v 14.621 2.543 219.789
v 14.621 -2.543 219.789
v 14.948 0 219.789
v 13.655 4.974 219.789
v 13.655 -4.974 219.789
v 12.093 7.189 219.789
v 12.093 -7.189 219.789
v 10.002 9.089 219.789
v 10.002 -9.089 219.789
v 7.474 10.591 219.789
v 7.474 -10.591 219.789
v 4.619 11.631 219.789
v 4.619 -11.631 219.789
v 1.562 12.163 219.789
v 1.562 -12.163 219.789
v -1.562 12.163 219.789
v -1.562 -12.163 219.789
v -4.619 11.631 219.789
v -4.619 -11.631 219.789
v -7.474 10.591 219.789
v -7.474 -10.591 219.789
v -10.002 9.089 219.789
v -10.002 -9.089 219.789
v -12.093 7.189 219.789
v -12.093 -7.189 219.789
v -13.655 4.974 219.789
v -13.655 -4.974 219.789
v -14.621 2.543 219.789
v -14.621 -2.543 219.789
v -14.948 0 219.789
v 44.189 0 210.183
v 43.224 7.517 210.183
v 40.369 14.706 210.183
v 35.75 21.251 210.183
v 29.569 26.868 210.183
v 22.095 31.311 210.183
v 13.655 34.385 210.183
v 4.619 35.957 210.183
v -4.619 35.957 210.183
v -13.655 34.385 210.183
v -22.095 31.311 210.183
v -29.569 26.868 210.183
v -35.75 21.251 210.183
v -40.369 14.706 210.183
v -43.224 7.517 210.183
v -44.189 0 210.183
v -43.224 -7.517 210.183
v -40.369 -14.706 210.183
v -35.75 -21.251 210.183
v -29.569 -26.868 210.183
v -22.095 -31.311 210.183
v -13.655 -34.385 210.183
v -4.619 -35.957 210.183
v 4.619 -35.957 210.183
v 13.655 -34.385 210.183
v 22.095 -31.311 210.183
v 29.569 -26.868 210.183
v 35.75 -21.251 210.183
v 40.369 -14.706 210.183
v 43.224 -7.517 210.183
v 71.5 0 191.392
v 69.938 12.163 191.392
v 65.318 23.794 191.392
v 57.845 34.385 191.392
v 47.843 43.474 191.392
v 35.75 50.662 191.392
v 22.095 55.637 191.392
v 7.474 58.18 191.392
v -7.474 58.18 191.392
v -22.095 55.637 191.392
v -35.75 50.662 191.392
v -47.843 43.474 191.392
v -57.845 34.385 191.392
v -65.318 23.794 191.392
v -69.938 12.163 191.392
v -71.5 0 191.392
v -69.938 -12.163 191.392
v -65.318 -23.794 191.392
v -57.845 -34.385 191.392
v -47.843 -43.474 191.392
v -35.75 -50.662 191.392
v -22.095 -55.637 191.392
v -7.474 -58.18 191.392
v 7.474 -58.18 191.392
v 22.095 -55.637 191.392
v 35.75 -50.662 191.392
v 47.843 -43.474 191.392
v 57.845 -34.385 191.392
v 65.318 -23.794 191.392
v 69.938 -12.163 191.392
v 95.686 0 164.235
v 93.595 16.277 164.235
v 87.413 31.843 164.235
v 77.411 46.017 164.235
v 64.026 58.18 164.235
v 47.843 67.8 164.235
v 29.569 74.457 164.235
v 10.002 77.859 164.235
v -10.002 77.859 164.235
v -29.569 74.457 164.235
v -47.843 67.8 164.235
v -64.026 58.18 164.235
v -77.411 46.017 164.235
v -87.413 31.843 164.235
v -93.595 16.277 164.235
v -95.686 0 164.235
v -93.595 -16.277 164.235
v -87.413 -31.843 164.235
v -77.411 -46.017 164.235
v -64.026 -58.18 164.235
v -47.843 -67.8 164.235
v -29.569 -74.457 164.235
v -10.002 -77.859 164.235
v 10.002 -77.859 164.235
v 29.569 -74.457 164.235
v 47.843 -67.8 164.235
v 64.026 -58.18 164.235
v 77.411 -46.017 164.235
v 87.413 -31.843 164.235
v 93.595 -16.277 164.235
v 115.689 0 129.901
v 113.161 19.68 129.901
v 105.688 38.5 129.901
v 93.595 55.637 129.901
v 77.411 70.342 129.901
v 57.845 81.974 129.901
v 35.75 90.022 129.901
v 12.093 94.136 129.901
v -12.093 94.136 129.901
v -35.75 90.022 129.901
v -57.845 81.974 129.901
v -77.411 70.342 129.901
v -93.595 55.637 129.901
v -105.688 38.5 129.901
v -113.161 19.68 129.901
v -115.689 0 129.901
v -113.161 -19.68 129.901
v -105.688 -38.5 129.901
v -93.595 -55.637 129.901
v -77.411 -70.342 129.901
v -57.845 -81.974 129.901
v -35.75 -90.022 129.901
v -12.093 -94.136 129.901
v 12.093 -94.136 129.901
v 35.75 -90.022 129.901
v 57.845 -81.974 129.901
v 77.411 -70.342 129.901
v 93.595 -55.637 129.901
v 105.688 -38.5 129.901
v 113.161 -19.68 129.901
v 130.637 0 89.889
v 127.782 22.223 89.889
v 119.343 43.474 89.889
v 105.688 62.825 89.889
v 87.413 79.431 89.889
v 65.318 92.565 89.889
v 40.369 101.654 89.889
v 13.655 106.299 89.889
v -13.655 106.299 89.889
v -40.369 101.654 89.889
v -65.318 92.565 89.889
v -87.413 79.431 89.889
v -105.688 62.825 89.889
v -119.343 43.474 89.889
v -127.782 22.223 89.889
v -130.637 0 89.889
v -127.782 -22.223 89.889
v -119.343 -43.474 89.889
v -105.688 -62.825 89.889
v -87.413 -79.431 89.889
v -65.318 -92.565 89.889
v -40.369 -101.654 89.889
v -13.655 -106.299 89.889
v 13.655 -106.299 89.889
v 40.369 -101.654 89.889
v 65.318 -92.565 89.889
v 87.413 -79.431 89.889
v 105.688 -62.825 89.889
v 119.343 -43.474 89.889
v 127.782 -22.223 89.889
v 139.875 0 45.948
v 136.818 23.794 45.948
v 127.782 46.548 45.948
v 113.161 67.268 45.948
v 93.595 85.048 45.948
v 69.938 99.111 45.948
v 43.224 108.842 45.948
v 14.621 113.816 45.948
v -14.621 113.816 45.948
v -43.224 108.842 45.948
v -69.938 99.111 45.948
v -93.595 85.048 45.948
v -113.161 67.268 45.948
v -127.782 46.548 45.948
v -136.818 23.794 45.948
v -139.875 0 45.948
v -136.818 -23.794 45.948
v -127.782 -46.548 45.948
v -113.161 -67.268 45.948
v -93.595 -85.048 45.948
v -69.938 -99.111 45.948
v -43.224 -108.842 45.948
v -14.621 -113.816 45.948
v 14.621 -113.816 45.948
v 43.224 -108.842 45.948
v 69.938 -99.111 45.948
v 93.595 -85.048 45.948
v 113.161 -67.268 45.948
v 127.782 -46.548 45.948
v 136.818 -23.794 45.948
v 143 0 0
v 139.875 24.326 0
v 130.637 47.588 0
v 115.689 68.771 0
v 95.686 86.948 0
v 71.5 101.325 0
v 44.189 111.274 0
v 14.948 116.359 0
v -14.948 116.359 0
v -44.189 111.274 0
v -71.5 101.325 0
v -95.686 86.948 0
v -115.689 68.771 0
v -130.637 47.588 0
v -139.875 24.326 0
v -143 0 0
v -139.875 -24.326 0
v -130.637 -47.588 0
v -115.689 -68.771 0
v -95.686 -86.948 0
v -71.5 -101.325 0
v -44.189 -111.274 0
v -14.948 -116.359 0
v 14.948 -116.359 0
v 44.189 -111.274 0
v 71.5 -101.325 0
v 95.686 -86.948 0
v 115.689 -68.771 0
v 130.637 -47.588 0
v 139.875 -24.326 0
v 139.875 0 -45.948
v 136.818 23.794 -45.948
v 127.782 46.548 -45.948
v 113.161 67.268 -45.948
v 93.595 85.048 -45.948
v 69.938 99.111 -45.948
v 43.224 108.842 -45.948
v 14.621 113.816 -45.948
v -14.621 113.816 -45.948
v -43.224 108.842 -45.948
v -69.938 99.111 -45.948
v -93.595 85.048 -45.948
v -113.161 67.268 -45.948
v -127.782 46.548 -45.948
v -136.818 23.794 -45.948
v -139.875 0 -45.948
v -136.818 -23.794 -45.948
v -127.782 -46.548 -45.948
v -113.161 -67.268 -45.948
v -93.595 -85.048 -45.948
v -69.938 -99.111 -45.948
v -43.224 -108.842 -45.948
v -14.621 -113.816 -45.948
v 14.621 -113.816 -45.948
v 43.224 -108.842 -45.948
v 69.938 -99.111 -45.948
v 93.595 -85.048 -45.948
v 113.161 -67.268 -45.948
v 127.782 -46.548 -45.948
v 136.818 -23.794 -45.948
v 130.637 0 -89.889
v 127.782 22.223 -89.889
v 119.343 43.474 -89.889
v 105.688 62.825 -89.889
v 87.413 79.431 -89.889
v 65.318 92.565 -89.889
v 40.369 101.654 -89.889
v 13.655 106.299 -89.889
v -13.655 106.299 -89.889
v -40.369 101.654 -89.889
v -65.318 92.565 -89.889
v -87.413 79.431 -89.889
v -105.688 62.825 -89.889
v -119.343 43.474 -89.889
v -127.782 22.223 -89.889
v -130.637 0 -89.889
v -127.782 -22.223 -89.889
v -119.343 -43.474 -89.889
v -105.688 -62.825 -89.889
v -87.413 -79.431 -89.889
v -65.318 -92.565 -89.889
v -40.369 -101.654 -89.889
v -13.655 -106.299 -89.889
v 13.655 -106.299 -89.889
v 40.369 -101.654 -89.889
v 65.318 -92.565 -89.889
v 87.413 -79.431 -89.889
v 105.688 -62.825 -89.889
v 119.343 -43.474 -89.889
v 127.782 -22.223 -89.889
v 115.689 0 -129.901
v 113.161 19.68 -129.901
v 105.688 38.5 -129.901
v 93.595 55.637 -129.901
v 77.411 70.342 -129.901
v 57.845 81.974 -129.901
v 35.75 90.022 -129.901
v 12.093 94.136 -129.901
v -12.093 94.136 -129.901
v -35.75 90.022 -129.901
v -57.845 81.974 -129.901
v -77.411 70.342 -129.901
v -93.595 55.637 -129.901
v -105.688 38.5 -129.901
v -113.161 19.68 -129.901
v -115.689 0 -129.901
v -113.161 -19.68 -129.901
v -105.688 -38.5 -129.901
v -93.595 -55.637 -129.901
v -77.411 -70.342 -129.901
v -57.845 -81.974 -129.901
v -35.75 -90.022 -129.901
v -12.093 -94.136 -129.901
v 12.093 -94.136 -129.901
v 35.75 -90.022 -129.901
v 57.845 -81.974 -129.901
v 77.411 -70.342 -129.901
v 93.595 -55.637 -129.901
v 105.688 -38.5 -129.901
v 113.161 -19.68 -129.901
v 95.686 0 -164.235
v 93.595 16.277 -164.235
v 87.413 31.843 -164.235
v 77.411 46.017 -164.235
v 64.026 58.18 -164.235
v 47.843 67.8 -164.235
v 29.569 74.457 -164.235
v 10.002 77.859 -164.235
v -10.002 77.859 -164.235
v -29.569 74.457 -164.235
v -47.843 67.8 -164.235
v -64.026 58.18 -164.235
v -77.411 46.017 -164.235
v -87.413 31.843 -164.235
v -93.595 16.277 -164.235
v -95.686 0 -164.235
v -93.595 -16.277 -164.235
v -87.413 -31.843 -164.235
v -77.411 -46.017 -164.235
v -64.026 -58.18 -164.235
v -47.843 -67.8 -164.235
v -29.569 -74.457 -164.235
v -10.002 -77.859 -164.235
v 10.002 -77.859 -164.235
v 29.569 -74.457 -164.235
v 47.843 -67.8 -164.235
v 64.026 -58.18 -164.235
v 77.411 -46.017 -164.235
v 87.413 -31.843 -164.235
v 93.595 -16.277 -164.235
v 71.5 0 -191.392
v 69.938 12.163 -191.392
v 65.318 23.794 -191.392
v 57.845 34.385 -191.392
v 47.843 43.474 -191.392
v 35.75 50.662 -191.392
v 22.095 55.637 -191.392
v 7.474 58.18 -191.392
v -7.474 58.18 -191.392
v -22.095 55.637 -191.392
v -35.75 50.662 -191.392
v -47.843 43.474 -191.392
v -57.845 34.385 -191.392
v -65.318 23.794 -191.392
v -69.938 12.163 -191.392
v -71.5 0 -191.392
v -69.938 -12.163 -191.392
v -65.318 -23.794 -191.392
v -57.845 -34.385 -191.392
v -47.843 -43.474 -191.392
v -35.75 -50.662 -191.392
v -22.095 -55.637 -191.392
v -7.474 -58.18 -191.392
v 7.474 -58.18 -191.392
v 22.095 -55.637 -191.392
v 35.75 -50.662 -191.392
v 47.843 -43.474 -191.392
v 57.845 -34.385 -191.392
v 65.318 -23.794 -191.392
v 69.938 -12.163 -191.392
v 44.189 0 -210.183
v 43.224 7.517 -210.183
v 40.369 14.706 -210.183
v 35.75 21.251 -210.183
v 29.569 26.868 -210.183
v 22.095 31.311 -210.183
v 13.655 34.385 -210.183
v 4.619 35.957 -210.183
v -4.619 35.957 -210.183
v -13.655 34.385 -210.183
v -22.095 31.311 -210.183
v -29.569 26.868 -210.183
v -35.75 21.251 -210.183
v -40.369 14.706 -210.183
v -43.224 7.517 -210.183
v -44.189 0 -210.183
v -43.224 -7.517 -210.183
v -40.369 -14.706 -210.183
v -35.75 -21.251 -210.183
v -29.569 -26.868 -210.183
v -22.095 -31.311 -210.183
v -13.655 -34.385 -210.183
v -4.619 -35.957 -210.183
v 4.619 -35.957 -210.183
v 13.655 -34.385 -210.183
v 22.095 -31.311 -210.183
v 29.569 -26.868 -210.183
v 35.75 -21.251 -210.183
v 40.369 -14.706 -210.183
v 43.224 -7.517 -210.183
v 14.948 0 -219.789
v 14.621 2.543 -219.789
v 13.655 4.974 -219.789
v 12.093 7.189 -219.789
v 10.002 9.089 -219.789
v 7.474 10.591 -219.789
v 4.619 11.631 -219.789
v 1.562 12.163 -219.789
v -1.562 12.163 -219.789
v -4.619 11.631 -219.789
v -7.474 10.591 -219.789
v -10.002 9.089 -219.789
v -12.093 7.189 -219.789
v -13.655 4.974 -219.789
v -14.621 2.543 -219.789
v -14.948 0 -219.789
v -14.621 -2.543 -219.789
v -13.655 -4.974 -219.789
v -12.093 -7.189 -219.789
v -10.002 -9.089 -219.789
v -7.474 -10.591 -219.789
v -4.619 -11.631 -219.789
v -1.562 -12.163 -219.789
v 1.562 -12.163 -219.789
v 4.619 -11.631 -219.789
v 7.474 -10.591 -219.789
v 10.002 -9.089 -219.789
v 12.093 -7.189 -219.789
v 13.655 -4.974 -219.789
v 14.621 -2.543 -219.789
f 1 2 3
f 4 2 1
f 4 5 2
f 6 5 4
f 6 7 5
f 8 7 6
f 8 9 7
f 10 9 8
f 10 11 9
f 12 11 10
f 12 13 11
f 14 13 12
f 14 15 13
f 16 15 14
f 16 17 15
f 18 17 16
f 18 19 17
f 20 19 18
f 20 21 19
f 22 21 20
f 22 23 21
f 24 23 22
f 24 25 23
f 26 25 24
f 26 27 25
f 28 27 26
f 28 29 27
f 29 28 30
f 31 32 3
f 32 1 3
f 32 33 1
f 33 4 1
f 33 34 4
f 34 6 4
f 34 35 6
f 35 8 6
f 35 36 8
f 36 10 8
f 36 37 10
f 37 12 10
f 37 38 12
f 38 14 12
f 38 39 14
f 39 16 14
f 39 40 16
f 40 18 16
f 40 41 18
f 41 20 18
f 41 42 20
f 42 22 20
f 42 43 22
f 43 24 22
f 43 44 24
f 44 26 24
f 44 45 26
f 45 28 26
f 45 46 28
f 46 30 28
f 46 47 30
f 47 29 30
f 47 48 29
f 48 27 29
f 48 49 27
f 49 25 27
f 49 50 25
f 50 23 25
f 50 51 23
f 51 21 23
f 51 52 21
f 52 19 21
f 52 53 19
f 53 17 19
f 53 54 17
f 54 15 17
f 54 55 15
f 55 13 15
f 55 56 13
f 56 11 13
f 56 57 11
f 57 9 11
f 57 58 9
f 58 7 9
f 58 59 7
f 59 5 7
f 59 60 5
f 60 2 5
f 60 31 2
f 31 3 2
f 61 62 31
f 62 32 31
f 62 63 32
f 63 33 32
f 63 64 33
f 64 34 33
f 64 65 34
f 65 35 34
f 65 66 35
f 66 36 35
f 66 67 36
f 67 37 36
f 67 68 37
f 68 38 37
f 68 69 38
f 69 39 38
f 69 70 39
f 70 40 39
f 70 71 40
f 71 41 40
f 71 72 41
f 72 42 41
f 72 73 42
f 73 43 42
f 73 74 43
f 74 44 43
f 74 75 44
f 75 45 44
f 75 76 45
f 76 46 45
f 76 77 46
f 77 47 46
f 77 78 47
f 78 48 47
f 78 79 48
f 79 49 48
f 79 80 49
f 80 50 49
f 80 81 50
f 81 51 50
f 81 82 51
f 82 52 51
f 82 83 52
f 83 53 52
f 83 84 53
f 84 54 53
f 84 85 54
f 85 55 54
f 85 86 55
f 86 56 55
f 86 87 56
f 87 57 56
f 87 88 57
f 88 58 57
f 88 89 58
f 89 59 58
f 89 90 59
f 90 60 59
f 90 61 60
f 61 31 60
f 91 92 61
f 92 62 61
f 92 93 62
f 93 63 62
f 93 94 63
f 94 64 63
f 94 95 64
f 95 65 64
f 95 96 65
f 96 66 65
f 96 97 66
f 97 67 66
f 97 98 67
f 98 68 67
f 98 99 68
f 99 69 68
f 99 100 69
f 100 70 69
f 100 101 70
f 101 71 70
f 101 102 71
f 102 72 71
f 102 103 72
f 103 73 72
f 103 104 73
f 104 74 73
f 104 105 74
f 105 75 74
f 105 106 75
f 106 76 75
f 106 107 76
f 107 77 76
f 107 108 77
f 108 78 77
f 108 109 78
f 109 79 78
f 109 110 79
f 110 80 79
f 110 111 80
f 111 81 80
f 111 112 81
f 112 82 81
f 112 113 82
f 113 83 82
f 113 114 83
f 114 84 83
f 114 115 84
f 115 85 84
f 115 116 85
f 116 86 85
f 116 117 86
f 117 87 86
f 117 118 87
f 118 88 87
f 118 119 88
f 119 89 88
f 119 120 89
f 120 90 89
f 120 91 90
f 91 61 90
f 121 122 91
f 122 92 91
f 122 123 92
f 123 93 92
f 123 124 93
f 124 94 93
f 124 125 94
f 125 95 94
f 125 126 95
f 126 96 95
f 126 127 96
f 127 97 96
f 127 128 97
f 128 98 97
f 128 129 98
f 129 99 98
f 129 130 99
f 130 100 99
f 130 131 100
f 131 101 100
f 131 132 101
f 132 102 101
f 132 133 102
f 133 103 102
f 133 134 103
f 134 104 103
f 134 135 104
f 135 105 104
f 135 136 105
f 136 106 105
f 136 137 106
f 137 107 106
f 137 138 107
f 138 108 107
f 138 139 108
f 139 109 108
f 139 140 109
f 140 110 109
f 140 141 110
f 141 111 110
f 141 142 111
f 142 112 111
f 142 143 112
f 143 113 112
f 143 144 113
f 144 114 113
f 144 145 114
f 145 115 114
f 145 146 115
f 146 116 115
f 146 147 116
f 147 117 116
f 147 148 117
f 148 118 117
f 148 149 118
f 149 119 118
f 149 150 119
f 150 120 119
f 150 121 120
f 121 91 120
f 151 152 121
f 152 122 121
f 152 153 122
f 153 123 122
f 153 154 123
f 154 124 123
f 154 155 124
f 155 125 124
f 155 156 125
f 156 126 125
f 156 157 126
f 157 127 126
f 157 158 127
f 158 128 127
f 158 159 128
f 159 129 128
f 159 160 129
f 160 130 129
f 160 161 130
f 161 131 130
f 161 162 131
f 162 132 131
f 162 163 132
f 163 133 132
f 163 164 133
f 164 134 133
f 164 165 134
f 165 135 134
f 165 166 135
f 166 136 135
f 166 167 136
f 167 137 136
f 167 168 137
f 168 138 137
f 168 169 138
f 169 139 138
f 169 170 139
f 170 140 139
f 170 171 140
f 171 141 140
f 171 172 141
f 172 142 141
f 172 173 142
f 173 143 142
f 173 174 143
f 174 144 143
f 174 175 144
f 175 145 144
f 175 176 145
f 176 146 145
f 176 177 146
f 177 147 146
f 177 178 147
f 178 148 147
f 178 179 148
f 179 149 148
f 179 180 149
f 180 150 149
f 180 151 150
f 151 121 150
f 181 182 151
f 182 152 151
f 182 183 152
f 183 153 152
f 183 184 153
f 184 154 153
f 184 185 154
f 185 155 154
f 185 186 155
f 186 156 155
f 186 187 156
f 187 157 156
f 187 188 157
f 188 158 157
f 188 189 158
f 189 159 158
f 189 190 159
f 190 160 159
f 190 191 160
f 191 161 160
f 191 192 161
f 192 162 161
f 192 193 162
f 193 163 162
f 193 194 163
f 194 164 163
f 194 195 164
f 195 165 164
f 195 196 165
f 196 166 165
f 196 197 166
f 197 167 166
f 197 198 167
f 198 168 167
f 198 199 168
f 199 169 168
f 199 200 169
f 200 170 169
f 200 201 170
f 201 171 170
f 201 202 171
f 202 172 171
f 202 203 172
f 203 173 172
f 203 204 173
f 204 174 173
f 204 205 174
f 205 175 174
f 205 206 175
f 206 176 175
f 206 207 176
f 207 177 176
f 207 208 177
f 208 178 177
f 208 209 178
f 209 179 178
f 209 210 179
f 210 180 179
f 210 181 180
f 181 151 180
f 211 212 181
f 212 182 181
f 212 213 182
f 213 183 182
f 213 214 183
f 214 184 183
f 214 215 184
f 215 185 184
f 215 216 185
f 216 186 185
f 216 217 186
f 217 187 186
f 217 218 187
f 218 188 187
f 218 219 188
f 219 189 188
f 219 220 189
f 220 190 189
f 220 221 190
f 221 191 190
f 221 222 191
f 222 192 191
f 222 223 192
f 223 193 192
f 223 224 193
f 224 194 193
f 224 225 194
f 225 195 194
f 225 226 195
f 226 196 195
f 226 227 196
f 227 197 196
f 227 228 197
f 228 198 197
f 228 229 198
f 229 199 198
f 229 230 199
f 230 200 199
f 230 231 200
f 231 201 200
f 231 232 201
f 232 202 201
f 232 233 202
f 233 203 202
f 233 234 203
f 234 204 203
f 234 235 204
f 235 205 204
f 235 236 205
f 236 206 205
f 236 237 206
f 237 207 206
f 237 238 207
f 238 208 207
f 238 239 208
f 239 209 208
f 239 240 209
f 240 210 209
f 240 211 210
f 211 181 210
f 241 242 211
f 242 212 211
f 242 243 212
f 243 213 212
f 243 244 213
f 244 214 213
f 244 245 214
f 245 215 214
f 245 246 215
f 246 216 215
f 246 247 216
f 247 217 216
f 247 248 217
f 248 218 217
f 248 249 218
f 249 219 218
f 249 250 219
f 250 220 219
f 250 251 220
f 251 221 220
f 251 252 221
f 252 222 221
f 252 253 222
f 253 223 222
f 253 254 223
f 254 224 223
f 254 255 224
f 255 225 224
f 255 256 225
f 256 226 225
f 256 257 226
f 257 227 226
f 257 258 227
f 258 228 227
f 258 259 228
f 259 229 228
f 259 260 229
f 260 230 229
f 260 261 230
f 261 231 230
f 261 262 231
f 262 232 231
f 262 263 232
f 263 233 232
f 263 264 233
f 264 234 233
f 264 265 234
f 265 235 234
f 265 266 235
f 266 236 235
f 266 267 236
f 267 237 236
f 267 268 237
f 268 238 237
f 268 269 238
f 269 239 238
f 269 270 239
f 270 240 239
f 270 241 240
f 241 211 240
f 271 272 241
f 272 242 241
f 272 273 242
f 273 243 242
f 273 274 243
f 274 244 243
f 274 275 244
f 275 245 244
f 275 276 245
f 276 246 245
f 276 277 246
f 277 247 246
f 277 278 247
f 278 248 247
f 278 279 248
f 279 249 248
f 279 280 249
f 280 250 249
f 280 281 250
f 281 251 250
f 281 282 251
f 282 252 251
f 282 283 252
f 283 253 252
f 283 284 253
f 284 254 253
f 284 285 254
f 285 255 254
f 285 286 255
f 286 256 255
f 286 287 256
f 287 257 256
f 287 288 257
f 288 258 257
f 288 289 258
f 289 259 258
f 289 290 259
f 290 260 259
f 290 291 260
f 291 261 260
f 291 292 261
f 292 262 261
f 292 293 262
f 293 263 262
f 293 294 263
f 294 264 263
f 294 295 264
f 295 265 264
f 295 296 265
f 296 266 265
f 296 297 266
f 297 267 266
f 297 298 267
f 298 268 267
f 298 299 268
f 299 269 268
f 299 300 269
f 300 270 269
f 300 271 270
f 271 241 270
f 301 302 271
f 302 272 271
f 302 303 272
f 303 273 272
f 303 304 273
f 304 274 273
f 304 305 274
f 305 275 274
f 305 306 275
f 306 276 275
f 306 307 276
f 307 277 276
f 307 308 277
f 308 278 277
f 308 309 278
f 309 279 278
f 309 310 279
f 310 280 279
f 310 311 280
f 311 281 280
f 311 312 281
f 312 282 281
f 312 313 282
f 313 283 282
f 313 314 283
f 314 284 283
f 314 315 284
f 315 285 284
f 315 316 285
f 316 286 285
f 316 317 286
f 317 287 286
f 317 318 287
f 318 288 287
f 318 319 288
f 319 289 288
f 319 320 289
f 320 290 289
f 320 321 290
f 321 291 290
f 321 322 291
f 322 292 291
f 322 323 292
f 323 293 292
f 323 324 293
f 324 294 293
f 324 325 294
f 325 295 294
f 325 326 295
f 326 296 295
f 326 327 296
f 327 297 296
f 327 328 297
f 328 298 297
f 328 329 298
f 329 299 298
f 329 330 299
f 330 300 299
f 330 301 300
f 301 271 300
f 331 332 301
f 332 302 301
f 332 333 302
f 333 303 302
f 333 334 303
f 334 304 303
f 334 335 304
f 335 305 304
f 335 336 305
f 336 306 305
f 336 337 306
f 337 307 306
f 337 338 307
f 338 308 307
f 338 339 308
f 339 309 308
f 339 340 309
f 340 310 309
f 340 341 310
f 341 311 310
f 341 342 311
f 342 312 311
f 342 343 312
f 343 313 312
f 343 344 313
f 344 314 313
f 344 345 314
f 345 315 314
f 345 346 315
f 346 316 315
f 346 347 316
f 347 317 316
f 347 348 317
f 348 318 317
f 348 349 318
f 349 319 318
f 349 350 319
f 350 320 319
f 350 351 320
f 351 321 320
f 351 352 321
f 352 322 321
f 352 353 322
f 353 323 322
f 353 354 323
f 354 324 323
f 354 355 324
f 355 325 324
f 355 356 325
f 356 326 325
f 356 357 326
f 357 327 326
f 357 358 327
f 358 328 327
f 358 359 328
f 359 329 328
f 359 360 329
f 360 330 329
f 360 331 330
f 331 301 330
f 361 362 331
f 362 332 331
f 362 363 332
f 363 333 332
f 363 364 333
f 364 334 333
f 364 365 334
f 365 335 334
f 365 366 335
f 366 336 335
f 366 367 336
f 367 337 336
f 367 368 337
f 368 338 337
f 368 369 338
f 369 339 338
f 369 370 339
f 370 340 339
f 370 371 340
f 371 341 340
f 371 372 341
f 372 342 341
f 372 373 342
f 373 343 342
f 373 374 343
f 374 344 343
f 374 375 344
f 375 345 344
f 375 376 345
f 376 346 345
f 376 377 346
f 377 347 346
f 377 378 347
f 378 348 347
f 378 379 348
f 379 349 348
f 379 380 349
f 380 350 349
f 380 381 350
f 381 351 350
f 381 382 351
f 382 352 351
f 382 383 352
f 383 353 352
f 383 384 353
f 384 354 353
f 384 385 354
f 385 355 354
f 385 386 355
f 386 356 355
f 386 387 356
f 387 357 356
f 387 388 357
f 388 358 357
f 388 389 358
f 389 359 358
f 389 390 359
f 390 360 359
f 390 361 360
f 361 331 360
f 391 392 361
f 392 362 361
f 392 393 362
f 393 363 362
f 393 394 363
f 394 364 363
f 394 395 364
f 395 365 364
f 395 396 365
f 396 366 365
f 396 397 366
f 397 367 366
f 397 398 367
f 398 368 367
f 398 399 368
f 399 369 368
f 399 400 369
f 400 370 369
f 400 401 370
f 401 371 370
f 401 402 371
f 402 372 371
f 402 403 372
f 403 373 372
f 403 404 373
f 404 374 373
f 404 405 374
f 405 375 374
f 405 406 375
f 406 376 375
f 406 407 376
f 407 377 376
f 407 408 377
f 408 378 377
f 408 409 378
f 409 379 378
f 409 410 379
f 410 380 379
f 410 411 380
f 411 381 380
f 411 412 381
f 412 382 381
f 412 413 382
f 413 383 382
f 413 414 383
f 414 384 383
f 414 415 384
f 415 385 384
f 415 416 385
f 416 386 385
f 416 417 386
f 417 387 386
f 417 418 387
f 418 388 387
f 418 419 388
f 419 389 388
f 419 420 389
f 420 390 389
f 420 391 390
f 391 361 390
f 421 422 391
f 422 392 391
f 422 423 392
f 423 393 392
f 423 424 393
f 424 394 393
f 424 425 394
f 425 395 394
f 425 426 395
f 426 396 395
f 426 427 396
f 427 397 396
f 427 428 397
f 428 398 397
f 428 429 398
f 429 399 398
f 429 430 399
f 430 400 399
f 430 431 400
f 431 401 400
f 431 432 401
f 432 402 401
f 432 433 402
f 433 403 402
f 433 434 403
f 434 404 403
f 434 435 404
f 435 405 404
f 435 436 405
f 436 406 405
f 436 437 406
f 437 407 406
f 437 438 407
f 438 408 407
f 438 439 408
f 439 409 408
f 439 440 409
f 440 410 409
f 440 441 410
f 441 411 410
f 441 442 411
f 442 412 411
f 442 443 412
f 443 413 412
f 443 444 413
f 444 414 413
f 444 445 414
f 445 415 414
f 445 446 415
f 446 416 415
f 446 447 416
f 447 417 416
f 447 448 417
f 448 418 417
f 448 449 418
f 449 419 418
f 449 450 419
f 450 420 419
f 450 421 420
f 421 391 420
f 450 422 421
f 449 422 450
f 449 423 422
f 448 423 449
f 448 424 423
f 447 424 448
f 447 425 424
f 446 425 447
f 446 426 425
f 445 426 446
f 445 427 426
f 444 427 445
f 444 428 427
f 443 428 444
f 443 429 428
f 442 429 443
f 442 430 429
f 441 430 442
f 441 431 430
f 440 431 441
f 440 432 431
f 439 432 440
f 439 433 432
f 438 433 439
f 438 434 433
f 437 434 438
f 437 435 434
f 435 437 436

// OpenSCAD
// Generated by SolidPython 1.0.1 on 2020-07-29 00:46:49


scale(v = [11, 9, 17]) {
	sphere(r = 13);
}
/***********************************************
*********      SolidPython code:      **********
************************************************
 
# import packages: SolidPython
from solid import *
from solid.utils import *
from itertools import chain, combinations, permutations


class Resize:

    def __init__(self, scad_file):
        self.scad_file = scad_file
        #self.scad_file = import_scad(scad_file)
        # cone/cylinder param:
        self.r1 = 0
        self.r2 = 0
        self.h = 0
        # rectangular prism param:
        self.w = 0
        self.l = 0
        # ellipse param:
        self.r = 0

    # import OpenScad code (file name corresponds to shape)


    # classify shape + parameters
    def assign(self, param1, param2, param3):
        if self.scad_file == 'cone.scad':
            self.r1 = param1
            self.r2 = param2
            self.h = param3
        elif self.scad_file == 'cylinder.scad':
            self.r1 = param1
            self.r2 = param2
            self.h = param3
        elif self.scad_file == 'rectangularPrism.scad':
            self.h = param1
            self.l = param2
            self.w = param3
        else:
            self.r = param1
            self.h = param2

    # resize parameters
    def iterate(self):
        x = range(3, 20, 2)
        i = 1
        if self.scad_file == 'cone.scad':
            tempList = list(permutations(x, 2))
            for temp in tempList:
                param1 = temp[0]
                param2 = temp[1]
                filepath = 'produced_scad_files/' + 'cone' + str(param1) + '_' + str(param2) + '_' + '.scad'
                scad_render_to_file(cylinder(h=param1, r1=param2, r2=0), filepath)

        elif self.scad_file == 'cylinder.scad':
            tempList = list(permutations(x, 3))
            for temp in tempList:
                param1 = temp[0]
                param2 = temp[1]
                filepath = 'produced_scad_files/' + 'cylinder' + str(param1) + '_' + str(param2) + '_' + '.scad'
                scad_render_to_file(cylinder(h=param1, r1=param2, r2=param2), filepath)

        elif self.scad_file == 'rectangularPrism.scad':
            tempList = list(permutations(x, 3))
            for temp in tempList:
                param1 = temp[0]
                param2 = temp[1]
                param3 = temp[2]
                filepath = 'produced_scad_files/' + 'rectangularPrism' + str(param1) + '_' + str(param2) + '_' + str(
                    param3) + '.scad'
                scad_render_to_file(cube(size=(param1, param2, param3)), filepath)

        elif self.scad_file == 'ellipse.scad':
            tempList = list(permutations(x, 4))
            for temp in tempList:
                param1 = temp[0]
                param2 = temp[1]
                param3 = temp[2]
                param4 = temp[3]
                filepath = 'produced_scad_files/' + 'ellipse' + str(param1) + '_' + str(param2) + '_' + str(param3) + '_' + str(param4) + '.scad'
                scad_render_to_file(scale([param1, param2, param3])(sphere(r=param4)), filepath)

    def render_to_scadfile(self):
        scad_render_to_file(scad, 'example.scad') 
 
************************************************/
